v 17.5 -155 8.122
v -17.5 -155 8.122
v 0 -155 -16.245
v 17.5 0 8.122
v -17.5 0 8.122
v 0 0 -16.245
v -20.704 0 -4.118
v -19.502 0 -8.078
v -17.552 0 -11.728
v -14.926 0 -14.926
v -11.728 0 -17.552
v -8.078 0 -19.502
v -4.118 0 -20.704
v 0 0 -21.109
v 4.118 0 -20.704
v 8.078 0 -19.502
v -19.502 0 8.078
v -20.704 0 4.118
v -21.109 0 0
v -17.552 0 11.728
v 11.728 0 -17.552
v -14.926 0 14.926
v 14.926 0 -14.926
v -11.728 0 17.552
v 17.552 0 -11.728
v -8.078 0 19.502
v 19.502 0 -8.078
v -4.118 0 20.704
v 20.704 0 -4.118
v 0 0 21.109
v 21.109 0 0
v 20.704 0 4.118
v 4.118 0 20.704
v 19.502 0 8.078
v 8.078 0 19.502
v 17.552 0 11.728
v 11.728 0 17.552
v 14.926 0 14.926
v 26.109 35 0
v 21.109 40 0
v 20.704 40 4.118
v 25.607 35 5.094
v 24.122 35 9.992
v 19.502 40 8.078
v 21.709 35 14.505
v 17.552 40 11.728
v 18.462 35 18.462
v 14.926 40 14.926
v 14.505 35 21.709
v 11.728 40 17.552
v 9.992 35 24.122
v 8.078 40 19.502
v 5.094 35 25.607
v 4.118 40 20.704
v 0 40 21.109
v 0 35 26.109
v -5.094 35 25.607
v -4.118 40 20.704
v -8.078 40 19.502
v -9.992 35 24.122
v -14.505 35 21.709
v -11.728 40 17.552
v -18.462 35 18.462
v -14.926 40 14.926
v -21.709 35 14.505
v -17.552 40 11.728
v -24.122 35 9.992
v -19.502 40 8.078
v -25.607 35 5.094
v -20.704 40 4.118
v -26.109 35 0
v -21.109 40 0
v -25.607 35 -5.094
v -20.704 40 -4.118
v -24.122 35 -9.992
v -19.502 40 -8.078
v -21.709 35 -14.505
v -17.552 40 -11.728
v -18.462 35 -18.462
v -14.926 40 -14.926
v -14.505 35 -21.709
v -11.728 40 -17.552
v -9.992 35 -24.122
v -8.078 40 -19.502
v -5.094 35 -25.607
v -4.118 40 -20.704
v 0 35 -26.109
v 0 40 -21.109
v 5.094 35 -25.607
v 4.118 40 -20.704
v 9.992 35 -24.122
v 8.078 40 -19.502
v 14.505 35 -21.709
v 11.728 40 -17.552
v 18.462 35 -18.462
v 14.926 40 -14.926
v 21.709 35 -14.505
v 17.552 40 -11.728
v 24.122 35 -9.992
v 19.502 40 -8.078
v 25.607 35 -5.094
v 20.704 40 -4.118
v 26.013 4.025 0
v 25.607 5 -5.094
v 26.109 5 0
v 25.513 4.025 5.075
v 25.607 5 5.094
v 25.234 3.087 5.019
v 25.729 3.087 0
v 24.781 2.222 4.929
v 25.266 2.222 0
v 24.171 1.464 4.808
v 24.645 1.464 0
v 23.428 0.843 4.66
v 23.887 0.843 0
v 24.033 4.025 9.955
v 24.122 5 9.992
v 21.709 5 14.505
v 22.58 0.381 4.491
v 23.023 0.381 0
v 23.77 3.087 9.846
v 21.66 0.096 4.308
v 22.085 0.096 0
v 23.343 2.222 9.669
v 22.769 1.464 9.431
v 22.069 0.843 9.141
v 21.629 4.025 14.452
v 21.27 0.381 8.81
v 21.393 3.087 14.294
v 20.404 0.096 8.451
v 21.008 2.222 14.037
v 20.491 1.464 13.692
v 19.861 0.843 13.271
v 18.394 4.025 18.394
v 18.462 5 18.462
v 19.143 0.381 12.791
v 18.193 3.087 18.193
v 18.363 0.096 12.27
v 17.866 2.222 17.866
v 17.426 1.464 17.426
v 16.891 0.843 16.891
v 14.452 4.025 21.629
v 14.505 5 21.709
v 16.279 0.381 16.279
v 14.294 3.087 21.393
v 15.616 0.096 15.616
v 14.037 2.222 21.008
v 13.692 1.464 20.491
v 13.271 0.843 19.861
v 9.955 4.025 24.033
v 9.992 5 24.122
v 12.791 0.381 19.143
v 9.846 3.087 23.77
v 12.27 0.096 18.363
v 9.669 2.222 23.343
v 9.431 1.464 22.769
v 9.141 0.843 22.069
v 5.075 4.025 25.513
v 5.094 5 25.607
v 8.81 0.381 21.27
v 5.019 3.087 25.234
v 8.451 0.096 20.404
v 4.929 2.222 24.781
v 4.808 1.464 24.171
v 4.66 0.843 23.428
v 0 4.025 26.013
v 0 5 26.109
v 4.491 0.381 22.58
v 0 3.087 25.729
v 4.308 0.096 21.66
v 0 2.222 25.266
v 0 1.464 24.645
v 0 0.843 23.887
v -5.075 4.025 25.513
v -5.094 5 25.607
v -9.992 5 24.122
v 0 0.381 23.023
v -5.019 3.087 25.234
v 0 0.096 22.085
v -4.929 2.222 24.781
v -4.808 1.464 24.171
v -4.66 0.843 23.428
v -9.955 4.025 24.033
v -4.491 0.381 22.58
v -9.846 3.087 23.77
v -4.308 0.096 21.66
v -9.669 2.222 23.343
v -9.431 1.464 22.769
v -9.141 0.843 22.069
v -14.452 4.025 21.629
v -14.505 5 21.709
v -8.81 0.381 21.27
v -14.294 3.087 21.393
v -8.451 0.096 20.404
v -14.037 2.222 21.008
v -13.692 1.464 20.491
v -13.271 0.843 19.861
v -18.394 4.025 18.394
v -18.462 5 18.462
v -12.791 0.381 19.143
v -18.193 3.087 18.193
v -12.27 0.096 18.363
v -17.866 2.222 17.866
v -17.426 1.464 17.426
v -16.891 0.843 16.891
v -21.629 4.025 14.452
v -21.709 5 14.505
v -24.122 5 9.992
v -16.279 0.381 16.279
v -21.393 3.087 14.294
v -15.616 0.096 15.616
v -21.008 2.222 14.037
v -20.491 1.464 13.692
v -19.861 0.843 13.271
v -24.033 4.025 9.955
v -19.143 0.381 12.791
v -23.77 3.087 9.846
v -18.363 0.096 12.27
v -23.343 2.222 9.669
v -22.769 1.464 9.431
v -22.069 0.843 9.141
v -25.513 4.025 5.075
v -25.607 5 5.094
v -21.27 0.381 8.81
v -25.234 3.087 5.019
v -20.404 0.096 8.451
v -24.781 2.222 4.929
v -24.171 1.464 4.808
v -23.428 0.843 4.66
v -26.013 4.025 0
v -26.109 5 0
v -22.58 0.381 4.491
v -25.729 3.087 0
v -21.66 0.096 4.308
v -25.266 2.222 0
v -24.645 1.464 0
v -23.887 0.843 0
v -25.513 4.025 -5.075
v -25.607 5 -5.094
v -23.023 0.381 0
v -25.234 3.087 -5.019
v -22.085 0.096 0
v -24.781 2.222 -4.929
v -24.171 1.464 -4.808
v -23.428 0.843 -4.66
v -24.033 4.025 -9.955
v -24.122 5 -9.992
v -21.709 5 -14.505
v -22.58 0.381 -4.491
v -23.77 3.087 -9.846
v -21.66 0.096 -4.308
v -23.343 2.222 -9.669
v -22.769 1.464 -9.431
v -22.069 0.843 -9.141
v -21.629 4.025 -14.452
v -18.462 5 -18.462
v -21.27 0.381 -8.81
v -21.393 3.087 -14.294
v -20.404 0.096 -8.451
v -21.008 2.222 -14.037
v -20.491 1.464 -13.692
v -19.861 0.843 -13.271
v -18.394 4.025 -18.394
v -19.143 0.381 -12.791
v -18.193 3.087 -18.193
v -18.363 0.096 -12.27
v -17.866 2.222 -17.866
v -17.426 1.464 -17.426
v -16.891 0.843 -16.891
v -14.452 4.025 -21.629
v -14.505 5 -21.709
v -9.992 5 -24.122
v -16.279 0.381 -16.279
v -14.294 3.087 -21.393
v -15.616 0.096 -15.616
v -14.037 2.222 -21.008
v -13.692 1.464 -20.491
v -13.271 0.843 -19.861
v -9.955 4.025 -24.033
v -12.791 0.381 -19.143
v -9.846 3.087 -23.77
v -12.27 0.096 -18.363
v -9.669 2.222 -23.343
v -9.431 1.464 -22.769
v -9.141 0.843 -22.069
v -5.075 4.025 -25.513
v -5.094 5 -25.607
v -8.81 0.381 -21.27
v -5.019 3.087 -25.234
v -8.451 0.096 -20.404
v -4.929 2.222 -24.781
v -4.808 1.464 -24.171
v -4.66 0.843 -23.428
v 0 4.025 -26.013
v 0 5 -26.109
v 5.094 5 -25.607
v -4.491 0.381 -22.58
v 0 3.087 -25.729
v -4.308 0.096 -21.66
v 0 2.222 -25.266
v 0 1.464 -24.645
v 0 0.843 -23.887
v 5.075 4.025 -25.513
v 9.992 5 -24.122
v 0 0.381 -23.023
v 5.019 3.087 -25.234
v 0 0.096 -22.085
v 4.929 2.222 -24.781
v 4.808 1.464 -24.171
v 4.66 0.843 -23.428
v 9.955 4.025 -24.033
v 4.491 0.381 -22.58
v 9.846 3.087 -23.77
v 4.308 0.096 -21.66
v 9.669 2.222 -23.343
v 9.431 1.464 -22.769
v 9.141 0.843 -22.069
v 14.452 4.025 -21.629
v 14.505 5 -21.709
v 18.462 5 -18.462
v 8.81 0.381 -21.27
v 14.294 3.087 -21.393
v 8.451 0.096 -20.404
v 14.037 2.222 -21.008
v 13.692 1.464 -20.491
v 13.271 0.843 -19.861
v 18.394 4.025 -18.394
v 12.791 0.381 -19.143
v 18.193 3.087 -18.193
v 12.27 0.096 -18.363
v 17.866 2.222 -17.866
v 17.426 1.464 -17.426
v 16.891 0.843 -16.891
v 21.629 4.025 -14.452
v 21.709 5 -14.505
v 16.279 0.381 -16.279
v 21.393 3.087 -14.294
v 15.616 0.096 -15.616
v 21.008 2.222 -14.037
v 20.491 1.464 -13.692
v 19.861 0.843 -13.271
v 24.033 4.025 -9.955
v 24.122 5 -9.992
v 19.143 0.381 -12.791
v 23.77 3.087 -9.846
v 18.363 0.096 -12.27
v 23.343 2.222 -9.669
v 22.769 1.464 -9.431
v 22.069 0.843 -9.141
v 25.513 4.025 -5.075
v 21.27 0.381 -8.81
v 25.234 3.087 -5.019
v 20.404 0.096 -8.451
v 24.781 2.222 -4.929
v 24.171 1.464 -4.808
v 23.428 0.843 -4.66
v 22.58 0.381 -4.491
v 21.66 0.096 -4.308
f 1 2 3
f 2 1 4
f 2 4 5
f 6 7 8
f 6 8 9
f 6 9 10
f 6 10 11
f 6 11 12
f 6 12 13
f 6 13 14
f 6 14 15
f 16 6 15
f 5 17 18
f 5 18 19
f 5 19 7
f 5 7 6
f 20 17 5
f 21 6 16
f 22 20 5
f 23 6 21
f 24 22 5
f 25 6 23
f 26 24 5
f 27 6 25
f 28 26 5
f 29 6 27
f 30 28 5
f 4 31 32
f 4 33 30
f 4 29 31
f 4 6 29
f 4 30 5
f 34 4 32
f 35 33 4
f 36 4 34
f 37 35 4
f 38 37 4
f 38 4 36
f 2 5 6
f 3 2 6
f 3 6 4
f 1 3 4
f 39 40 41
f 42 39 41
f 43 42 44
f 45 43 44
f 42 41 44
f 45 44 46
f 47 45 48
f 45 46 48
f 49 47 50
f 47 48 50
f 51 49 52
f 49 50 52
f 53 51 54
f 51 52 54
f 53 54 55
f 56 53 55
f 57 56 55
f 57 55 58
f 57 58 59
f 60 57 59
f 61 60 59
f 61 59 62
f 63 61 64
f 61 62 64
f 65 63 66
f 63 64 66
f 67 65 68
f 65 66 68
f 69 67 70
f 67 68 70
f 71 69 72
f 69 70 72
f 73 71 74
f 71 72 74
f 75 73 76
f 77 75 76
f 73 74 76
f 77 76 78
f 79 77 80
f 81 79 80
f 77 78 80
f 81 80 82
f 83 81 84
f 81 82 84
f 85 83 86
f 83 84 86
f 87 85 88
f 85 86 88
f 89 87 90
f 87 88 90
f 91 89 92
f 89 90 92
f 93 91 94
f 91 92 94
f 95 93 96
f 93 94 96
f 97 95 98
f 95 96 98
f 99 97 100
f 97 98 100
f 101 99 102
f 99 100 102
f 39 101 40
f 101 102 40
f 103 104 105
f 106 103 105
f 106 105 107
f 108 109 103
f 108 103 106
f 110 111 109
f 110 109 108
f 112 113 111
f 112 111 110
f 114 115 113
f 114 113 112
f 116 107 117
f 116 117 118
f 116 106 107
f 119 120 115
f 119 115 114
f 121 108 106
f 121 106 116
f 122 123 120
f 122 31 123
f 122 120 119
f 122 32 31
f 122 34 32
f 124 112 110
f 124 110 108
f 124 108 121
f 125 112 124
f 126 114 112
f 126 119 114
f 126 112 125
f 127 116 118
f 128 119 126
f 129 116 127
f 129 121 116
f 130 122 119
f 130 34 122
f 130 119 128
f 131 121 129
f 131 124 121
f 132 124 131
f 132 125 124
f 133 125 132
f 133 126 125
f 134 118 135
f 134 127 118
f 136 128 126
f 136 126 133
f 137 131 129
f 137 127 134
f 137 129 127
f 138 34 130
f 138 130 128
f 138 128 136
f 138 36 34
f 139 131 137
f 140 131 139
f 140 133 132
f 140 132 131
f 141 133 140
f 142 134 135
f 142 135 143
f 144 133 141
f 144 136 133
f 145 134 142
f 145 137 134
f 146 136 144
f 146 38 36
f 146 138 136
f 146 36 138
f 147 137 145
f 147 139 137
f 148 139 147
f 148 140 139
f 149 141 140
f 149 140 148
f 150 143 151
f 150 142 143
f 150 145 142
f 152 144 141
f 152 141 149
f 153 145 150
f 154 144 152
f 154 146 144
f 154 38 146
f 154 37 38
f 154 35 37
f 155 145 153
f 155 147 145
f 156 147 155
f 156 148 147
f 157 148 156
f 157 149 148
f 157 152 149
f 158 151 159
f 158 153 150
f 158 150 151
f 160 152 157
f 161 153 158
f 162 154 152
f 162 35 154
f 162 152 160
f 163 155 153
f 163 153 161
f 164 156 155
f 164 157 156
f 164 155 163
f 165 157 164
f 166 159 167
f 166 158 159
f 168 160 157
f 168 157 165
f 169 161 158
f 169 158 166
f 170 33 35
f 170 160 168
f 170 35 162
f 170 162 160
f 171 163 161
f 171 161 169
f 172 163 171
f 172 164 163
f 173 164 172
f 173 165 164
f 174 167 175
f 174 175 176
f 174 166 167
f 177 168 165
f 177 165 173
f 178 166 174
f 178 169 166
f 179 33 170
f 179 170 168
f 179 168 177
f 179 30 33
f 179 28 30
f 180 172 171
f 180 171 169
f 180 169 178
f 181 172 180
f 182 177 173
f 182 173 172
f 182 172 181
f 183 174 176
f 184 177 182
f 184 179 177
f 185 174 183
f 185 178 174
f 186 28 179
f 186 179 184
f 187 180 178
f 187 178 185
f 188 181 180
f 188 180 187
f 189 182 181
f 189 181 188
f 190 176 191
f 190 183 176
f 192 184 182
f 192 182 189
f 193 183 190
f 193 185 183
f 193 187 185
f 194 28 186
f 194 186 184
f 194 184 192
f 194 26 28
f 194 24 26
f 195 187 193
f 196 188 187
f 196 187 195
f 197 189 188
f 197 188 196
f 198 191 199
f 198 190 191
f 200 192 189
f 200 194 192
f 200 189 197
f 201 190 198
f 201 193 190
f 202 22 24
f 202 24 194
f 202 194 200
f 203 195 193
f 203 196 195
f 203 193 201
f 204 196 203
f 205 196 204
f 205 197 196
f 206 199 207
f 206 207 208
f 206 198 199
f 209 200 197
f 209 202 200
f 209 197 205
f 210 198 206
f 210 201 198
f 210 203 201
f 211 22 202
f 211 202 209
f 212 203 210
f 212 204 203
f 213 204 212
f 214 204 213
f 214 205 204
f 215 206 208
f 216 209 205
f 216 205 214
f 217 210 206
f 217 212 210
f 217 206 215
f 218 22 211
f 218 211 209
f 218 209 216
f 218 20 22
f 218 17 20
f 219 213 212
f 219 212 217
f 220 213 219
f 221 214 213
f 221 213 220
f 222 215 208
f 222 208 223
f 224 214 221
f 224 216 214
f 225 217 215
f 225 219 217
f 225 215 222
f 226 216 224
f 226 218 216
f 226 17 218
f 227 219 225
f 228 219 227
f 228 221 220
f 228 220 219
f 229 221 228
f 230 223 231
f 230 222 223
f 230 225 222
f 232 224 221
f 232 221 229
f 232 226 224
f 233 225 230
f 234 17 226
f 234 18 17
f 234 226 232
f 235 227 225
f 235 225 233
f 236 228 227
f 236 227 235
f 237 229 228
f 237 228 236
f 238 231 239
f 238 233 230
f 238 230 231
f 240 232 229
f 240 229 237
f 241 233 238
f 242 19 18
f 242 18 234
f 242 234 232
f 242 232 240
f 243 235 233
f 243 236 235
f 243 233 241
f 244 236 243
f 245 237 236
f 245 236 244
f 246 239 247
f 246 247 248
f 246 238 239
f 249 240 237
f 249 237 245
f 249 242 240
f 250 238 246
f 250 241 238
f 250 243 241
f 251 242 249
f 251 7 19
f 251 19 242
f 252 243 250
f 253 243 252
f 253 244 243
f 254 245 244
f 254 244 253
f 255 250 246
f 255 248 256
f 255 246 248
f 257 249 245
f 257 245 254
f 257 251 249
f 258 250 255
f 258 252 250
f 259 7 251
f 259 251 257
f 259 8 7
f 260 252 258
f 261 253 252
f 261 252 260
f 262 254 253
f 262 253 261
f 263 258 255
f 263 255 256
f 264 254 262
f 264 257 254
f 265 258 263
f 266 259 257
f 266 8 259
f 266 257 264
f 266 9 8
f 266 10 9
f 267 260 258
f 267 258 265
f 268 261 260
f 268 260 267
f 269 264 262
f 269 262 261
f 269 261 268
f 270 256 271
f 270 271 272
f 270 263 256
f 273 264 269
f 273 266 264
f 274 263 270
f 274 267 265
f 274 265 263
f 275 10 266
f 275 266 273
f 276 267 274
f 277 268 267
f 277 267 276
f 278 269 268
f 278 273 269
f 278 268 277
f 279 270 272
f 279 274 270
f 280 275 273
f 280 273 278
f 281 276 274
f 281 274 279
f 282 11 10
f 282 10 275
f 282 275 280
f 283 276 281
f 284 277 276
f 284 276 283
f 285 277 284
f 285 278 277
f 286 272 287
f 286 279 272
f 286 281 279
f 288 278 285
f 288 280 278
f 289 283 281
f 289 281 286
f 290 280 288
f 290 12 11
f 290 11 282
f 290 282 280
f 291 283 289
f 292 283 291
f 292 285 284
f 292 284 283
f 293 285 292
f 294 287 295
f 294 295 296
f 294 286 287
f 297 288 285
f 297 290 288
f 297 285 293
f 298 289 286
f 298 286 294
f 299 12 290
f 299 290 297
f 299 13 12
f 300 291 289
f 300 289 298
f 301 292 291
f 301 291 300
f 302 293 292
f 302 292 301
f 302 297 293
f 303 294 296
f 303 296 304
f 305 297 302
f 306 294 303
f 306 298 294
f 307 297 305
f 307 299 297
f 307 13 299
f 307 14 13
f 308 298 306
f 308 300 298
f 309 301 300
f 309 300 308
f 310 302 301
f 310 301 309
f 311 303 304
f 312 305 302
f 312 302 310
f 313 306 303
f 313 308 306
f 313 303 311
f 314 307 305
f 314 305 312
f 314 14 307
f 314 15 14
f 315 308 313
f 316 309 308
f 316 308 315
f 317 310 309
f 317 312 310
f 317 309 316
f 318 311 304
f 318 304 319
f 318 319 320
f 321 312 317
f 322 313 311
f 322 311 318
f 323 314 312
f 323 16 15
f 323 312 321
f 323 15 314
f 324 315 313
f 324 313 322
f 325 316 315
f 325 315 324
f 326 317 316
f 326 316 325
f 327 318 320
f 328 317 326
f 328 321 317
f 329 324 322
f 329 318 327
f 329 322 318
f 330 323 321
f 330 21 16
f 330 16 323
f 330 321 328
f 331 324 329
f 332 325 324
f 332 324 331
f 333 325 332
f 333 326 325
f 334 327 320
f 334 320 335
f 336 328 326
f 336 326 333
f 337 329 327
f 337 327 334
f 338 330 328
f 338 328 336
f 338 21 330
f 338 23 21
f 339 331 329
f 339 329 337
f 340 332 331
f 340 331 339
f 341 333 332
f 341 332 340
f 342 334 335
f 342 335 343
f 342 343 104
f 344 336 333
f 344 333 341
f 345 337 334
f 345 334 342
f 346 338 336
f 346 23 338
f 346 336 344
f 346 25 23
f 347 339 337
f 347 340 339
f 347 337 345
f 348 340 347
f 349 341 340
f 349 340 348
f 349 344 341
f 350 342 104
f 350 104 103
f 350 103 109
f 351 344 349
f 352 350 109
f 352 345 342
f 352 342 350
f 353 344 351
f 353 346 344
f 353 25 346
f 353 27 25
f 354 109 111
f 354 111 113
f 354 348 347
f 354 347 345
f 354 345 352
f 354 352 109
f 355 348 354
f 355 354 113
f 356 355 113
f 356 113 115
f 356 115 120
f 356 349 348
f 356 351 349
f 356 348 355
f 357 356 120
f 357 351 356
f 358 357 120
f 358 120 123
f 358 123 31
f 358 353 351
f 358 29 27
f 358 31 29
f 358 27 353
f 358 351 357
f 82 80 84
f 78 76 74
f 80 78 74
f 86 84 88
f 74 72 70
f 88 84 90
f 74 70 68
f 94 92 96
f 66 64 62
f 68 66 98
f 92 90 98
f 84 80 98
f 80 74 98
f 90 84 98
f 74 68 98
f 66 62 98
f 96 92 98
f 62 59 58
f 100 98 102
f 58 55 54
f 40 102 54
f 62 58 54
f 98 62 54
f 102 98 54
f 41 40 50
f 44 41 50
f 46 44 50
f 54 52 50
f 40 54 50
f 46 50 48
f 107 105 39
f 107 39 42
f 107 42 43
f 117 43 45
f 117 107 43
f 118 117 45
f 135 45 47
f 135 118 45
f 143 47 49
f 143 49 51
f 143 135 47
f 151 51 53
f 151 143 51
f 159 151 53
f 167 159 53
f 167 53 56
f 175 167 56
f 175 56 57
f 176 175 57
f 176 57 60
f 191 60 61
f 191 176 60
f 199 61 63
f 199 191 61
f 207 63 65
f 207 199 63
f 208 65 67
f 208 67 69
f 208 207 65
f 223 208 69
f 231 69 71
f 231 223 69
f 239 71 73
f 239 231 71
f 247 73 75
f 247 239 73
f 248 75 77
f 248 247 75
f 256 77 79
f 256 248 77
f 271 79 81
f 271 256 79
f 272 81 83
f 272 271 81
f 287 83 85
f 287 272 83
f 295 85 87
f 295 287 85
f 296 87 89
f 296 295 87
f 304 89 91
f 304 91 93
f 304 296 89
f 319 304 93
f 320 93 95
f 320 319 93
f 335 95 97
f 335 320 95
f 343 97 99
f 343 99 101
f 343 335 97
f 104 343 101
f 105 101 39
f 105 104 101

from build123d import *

# Parameters (mm, degrees)
F1_DEPTH = 155
F2_R     = 26.10915
F3_DEPTH = 40
F4_SIZE  = 5
F5_R     = 5


with BuildPart() as f1:
    # F0 (on Front) → F1 (new body)
    with BuildSketch(Plane.XZ):
        Polygon((17.5, 8.122329), (-17.5, 8.122329), (0, -16.244657), align=None)
    extrude(amount=F1_DEPTH)

    # F2 (on Front) → F3 (join)
    with BuildSketch(Plane.XZ):
        Circle(F2_R)
    extrude(amount=-F3_DEPTH)

    # F4
    f4_edges = [f1.edges().sort_by_distance(p)[0] for p in [
        (-26.10915, 40, 0),
    ]]
    chamfer(f4_edges, length=F4_SIZE)

    # F5
    f5_edges = [f1.edges().sort_by_distance(p)[0] for p in [
        (-26.10915, 0, 0),
    ]]
    fillet(f5_edges, radius=F5_R)


solid = f1.part
